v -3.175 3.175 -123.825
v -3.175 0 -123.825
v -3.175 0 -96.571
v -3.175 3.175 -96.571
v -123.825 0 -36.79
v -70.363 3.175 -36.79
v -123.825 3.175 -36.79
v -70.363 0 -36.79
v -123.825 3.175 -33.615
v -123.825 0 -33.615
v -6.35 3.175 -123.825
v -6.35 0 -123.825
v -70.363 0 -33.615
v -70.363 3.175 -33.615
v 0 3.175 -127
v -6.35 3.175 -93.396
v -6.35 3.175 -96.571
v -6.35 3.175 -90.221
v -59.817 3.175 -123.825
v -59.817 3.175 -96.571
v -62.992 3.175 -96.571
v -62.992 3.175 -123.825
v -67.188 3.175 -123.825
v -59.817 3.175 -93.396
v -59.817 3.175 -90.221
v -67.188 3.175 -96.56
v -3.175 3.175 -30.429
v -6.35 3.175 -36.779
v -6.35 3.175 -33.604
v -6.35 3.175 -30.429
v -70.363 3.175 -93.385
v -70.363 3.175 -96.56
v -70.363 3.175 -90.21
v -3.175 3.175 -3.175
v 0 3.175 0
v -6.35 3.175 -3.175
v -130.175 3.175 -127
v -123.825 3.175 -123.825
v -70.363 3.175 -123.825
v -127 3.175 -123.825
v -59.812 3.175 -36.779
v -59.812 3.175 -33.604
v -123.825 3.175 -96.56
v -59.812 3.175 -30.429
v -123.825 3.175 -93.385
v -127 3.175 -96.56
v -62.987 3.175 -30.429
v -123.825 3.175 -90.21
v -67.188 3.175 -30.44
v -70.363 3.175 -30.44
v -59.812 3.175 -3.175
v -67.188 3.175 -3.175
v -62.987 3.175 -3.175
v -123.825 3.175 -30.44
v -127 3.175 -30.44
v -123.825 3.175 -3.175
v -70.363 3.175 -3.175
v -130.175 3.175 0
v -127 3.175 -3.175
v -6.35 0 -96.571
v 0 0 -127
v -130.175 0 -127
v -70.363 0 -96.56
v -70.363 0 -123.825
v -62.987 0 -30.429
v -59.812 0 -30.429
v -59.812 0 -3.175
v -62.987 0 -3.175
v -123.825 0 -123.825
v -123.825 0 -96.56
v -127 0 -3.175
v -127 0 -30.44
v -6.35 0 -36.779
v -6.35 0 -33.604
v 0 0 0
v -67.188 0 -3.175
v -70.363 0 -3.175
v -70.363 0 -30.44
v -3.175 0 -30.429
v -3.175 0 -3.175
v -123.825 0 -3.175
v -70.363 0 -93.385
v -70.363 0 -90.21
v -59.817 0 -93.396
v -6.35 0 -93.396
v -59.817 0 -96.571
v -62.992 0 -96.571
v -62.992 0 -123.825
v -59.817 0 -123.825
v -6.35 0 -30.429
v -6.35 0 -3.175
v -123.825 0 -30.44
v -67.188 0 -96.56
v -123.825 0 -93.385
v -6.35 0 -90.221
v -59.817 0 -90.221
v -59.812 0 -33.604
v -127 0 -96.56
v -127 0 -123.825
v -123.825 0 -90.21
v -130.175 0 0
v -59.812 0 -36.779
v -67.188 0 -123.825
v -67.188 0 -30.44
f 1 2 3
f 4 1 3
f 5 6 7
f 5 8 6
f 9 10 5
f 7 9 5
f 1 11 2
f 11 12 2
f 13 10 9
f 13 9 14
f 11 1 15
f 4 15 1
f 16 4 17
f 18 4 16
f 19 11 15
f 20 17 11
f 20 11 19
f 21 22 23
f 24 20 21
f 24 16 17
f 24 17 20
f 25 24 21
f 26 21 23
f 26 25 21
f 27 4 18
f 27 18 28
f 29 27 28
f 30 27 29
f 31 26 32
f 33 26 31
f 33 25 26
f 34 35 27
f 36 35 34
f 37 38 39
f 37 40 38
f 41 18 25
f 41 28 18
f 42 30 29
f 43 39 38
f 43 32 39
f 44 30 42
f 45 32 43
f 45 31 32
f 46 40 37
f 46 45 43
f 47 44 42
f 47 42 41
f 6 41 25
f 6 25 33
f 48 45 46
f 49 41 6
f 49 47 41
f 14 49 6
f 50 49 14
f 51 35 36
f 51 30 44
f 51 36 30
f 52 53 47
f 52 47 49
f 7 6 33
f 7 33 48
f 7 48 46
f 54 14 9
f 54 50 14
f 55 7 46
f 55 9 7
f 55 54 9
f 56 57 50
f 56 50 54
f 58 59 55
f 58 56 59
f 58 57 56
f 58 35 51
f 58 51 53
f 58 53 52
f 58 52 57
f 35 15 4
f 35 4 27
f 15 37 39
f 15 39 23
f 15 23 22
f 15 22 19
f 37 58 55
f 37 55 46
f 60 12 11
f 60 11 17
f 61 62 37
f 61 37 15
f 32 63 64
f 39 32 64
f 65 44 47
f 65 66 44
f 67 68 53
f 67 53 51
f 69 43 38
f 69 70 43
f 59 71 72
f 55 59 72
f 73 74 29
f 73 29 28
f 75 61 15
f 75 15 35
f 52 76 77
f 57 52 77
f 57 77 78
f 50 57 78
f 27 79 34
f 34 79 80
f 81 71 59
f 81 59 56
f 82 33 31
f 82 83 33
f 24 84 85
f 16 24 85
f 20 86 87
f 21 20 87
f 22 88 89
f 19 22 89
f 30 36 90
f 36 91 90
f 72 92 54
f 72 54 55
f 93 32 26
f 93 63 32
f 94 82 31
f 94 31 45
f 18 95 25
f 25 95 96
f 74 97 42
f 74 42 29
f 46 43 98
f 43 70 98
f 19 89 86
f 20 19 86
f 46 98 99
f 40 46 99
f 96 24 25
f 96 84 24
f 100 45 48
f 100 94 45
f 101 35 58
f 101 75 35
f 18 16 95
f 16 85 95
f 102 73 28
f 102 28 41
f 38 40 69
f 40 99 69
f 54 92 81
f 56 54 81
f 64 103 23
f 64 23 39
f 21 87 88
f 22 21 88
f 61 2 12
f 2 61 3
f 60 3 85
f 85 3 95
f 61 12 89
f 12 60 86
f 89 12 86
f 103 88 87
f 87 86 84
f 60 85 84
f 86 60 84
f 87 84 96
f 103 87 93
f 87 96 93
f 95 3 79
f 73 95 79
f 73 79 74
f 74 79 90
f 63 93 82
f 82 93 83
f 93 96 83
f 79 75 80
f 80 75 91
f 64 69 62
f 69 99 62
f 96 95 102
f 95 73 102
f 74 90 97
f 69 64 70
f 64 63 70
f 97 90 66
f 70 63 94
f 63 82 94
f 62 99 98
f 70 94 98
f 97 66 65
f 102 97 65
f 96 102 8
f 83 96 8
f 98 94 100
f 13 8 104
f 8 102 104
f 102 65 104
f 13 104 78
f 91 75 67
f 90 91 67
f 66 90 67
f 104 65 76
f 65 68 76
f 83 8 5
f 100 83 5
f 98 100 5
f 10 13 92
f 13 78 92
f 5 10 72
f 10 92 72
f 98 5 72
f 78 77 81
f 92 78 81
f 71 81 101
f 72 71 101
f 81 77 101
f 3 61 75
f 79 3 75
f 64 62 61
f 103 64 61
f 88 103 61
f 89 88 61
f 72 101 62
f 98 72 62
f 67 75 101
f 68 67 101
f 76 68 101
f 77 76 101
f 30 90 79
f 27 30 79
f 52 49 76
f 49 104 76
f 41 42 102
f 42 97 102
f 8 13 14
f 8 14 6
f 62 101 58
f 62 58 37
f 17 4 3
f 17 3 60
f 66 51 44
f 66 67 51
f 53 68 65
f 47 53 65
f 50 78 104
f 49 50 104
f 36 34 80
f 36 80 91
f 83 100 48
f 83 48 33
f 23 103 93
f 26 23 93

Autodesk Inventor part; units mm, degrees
ref_plane "YZ Plane" through (0, 0, 0) normal (1, 0, 0) x (0, 1, 0)
ref_plane "XZ Plane" through (0, 0, 0) normal (0, 1, 0) x (-1, 0, 0)
ref_plane "XY Plane" through (0, 0, 0) normal (0, 0, 1) x (1, 0, 0)
sketch "Sketch1" plane through (0, 0, 0) normal (0, 1, 0) x (-1, 0, 0)
  line L0 (0, 0) -> (127, 0)
  line L1 (127, 0) -> (127, -127)
  line L2 (127, -127) -> (0, -127)
  line L3 (0, -127) -> (0, 0)
  line L4 (123.825, 0) -> (127, 0)
  line L5 (127, 0) -> (127, -33.615)
  line L6 (127, -33.615) -> (123.825, -33.615)
  line L7 (123.825, -33.615) -> (123.825, 0)
  line L8 (123.825, -33.615) -> (70.363, -33.615)
  line L9 (70.363, -33.615) -> (70.363, -36.79)
  line L10 (70.363, -36.79) -> (127, -36.79)
  line L11 (70.363, -36.79) -> (67.188, -36.79)
  line L12 (67.188, -36.79) -> (67.188, 0)
  line L13 (67.188, 0) -> (70.363, 0)
  line L14 (70.363, 0) -> (70.363, -36.79)
  line L15 (127, -90.21) -> (67.188, -90.21)
  line L16 (67.188, -90.21) -> (67.188, -93.385)
  line L17 (67.188, -93.385) -> (127, -93.385)
  line L18 (127, -93.385) -> (127, -90.21)
  line L19 (127, -93.385) -> (123.825, -93.385)
  line L20 (123.825, -93.385) -> (123.825, -127)
  line L21 (123.825, -127) -> (127, -127)
  line L22 (127, -127) -> (127, -93.385)
  line L23 (25.4, 0) -> (6.35, 0)
  line L24 (25.4, -127) -> (6.35, -127)
  line L25 (67.188, -90.21) -> (70.363, -90.21)
  line L26 (70.363, -90.21) -> (70.363, -127)
  line L27 (70.363, -127) -> (67.188, -127)
  line L28 (67.188, -127) -> (67.188, -90.21)
  line L29 (67.188, -3.175) -> (70.363, -3.175)
  line L30 (70.363, -3.175) -> (70.363, -33.615)
  line L31 (70.363, -33.615) -> (67.188, -33.615)
  line L32 (67.188, -33.615) -> (67.188, -3.175)
  line L33 (73.538, -33.615) -> (123.825, -33.615)
  line L34 (123.825, -33.615) -> (123.825, -36.79)
  line L35 (123.825, -36.79) -> (73.538, -36.79)
  line L36 (127, -3.175) -> (123.825, -3.175)
  line L37 (123.825, -3.175) -> (123.825, -30.44)
  line L38 (123.825, -30.44) -> (127, -30.44)
  line L39 (127, -30.44) -> (127, -3.175)
  line L40 (123.825, -90.21) -> (81.7068, -90.21)
  line L41 (81.7068, -93.385) -> (123.825, -93.385)
  line L42 (123.825, -93.385) -> (123.825, -90.21)
  line L43 (123.825, -96.56) -> (127, -96.56)
  line L44 (127, -96.56) -> (127, -123.825)
  line L45 (127, -123.825) -> (123.825, -123.825)
  line L46 (123.825, -123.825) -> (123.825, -96.56)
  line L47 (70.363, -96.56) -> (67.188, -96.56)
  line L48 (67.188, -96.56) -> (67.188, -123.825)
  line L49 (67.188, -123.825) -> (70.363, -123.825)
  line L50 (70.363, -123.825) -> (70.363, -96.56)
  line L51 (70.363, -30.44) -> (67.188, -30.44)
  line L52 (22.225, 0) -> (9.525, 0)
  line L53 (9.525, -127) -> (22.225, -127)
  line L54 (127, 0) -> (130.175, 0)
  line L55 (130.175, 0) -> (130.175, -127)
  line L56 (130.175, -127) -> (127, -127)
  line L57 (127, -127) -> (127, 0)
  line L58 (3.175, 0) -> (0, 0)
  line L59 (0, 0) -> (0, -127)
  line L60 (0, -127) -> (3.175, -127)
  line L61 (3.175, -127) -> (3.175, 0)
  line L62 (62.987, 0) -> (62.987, -33.6042)
  line L63 (62.987, -33.6042) -> (59.812, -33.6042)
  line L64 (59.812, -33.6042) -> (59.812, -4.3263)
  line L65 (59.812, -33.6042) -> (6.35, -33.6042)
  line L66 (6.35, -33.6042) -> (6.35, -36.7792)
  line L67 (6.35, -36.7792) -> (62.987, -36.7792)
  line L68 (6.35, -36.7792) -> (3.175, -36.7792)
  line L69 (3.175, -36.7792) -> (3.175, -2.1822)
  line L70 (6.35, 0) -> (6.35, -36.7792)
  line L71 (3.175, -3.175) -> (6.35, -3.175)
  line L72 (6.35, -3.175) -> (6.35, -33.6042)
  line L73 (6.35, -33.6042) -> (3.175, -33.6042)
  line L74 (3.175, -33.6042) -> (3.175, -3.175)
  line L75 (59.812, -33.6042) -> (59.812, -36.7792)
  line L76 (62.987, -3.175) -> (59.812, -3.175)
  line L77 (59.812, -3.175) -> (59.812, -30.4292)
  line L78 (59.812, -30.4292) -> (62.987, -30.4292)
  line L79 (62.987, -30.4292) -> (62.987, -3.175)
  line L80 (6.35, -30.4292) -> (3.175, -30.4292)
  line L81 (62.987, -36.7792) -> (62.987, 0)
  line L82 (59.812, -3.175) -> (59.812, 0)
  line L83 (62.992, -127) -> (59.817, -127)
  line L84 (59.817, -127) -> (59.817, -90.2208)
  line L85 (59.817, -90.2208) -> (62.992, -90.2208)
  line L86 (62.992, -90.2208) -> (62.992, -127)
  line L87 (62.992, -93.3958) -> (3.175, -93.3958)
  line L88 (3.175, -93.3958) -> (3.175, -90.2208)
  line L89 (3.175, -90.2208) -> (62.992, -90.2208)
  line L90 (62.992, -90.2208) -> (62.992, -93.3958)
  line L91 (6.35, -90.2208) -> (3.175, -90.2208)
  line L92 (3.175, -90.2208) -> (3.175, -127)
  line L93 (3.175, -127) -> (6.35, -127)
  line L94 (6.35, -127) -> (6.35, -90.2208)
  line L95 (6.35, -123.825) -> (3.175, -123.825)
  line L96 (3.175, -123.825) -> (3.175, -96.5708)
  line L97 (3.175, -96.5708) -> (6.35, -96.5708)
  line L98 (6.35, -96.5708) -> (6.35, -123.825)
  line L99 (62.992, -123.825) -> (59.817, -123.825)
  line L100 (59.817, -123.825) -> (59.817, -96.5708)
  line L101 (59.817, -96.5708) -> (62.992, -96.5708)
  line L102 (62.992, -96.5708) -> (62.992, -123.825)
  point P0 (97.094, -33.615)
  point P1 (123.825, -110.1925)
  point P2 (123.825, -16.8075)
  point P3 (125.4125, 0)
  point P4 (125.4125, -3.175)
  point P5 (125.4125, -33.615)
  point P6 (70.363, -35.2025)
  point P7 (68.7755, -36.79)
  point P8 (68.7755, -33.615)
  point P9 (68.7755, 0)
  point P10 (68.7755, -3.175)
  point P11 (68.7755, -127)
  point P12 (68.7755, -123.825)
  point P13 (70.363, -93.385)
  point P14 (70.363, -30.44)
  point P15 (127, -96.56)
  point P16 (127, -30.44)
  point P17 (123.825, -33.615)
  point P18 (67.188, -96.56)
  point P19 (127, -93.385)
  point P20 (33.081, -33.6042)
  point P21 (59.812, -18.9652)
  point P22 (61.3995, -3.175)
  point P23 (61.3995, -33.6042)
  point P24 (6.35, -35.1917)
  point P25 (4.7625, -36.7792)
  point P26 (4.7625, -33.6042)
  point P27 (4.7625, -3.175)
  point P28 (59.817, -93.3958)
  point P29 (6.35, -93.3958)
  point P30 (3.175, -3.175)
  dimension "d0" = 127
  dimension "d2" = 127
  dimension "d5" = 33.615
  dimension "d6" = 33.615
  dimension "d7" = 53.462
  dimension "d8" = 53.462
  dimension "d9" = 3.175
  dimension "d10" = 3.175
  dimension "d11" = 3.175
  dimension "d12" = 3.175
  dimension "d13" = 3.175
  dimension "d14" = 3.175
  dimension "d28" = 3.175
  dimension "d29" = 3.175
  dimension "d30" = 3.175
  dimension "d32" = 3.175
  dimension "d33" = 3.175
  dimension "d34" = 3.175
  dimension "d35" = 3.175
  dimension "d36" = 3.175
  dimension "d37" = 3.175
  dimension "d38" = 3.175
  dimension "d57" = 3.175
  dimension "d58" = 3.175
  dimension "d90" = 53.462
  dimension "d91" = 3.175
  dimension "d92" = 3.175
  dimension "d93" = 3.175
  dimension "d94" = 3.175
  dimension "d96" = 3.175
  dimension "d97" = 3.175
  dimension "d98" = 0
  dimension "d99" = 3.175
  dimension "d100" = 3.175
  dimension "d101" = 33.6042
  dimension "d102" = 33.6042
  dimension "d103" = 53.467
  dimension "d104" = 0
  dimension "d105" = 0
  dimension "d106" = 0
  dimension "d107" = 3.175
  dimension "d108" = 3.175
  dimension "d109" = 3.175
  dimension "d110" = 3.175
  dimension "d111" = 3.175
  dimension "d112" = 3.175
  dimension "d113" = 3.175
extrude "Extrusion1" add sketch "Sketch1" along normal blind 3.175 contours L0 L61 L2 L3 | L0 L70 L71 L61 | L0 L82 L77 L64 L65 L70 | L61 L95 L94 L2 | L94 L87 L84 L2 | L70 L73 L61 L80 | L61 L87 L94 L97 | L66 L68 L61 L73 | L61 L89 L94 L87 | L0 L62 L76 L82 | L64 L78 L62 L63 | L63 L81 L67 L75 | L67 L81 L62 L0 L12 L11 L10 L1 L15 L16 L28 L2 L86 L85 L89 L61 L68 | L84 L99 L86 L2 | L87 L86 L101 L84 | L84 L85 L86 L87 | L0 L14 L29 L12 | L0 L7 L8 L14 | L28 L49 L26 L2 | L0 L1 L36 L7 | L51 L14 L31 L12 | L26 L17 L20 L2 | L54 L55 L56 L1 | L31 L9 L11 L12 | L20 L45 L1 L2 | L28 L17 L26 L47 | L38 L1 L6 L7 | L16 L15 L26 L17 | L6 L1 L10 L34 | L20 L17 L1 L43 | L42 L15 L1 L17
equation "\"d3\" = d41"
equation "\"d41\" = 3.175"
properties part number "top"
